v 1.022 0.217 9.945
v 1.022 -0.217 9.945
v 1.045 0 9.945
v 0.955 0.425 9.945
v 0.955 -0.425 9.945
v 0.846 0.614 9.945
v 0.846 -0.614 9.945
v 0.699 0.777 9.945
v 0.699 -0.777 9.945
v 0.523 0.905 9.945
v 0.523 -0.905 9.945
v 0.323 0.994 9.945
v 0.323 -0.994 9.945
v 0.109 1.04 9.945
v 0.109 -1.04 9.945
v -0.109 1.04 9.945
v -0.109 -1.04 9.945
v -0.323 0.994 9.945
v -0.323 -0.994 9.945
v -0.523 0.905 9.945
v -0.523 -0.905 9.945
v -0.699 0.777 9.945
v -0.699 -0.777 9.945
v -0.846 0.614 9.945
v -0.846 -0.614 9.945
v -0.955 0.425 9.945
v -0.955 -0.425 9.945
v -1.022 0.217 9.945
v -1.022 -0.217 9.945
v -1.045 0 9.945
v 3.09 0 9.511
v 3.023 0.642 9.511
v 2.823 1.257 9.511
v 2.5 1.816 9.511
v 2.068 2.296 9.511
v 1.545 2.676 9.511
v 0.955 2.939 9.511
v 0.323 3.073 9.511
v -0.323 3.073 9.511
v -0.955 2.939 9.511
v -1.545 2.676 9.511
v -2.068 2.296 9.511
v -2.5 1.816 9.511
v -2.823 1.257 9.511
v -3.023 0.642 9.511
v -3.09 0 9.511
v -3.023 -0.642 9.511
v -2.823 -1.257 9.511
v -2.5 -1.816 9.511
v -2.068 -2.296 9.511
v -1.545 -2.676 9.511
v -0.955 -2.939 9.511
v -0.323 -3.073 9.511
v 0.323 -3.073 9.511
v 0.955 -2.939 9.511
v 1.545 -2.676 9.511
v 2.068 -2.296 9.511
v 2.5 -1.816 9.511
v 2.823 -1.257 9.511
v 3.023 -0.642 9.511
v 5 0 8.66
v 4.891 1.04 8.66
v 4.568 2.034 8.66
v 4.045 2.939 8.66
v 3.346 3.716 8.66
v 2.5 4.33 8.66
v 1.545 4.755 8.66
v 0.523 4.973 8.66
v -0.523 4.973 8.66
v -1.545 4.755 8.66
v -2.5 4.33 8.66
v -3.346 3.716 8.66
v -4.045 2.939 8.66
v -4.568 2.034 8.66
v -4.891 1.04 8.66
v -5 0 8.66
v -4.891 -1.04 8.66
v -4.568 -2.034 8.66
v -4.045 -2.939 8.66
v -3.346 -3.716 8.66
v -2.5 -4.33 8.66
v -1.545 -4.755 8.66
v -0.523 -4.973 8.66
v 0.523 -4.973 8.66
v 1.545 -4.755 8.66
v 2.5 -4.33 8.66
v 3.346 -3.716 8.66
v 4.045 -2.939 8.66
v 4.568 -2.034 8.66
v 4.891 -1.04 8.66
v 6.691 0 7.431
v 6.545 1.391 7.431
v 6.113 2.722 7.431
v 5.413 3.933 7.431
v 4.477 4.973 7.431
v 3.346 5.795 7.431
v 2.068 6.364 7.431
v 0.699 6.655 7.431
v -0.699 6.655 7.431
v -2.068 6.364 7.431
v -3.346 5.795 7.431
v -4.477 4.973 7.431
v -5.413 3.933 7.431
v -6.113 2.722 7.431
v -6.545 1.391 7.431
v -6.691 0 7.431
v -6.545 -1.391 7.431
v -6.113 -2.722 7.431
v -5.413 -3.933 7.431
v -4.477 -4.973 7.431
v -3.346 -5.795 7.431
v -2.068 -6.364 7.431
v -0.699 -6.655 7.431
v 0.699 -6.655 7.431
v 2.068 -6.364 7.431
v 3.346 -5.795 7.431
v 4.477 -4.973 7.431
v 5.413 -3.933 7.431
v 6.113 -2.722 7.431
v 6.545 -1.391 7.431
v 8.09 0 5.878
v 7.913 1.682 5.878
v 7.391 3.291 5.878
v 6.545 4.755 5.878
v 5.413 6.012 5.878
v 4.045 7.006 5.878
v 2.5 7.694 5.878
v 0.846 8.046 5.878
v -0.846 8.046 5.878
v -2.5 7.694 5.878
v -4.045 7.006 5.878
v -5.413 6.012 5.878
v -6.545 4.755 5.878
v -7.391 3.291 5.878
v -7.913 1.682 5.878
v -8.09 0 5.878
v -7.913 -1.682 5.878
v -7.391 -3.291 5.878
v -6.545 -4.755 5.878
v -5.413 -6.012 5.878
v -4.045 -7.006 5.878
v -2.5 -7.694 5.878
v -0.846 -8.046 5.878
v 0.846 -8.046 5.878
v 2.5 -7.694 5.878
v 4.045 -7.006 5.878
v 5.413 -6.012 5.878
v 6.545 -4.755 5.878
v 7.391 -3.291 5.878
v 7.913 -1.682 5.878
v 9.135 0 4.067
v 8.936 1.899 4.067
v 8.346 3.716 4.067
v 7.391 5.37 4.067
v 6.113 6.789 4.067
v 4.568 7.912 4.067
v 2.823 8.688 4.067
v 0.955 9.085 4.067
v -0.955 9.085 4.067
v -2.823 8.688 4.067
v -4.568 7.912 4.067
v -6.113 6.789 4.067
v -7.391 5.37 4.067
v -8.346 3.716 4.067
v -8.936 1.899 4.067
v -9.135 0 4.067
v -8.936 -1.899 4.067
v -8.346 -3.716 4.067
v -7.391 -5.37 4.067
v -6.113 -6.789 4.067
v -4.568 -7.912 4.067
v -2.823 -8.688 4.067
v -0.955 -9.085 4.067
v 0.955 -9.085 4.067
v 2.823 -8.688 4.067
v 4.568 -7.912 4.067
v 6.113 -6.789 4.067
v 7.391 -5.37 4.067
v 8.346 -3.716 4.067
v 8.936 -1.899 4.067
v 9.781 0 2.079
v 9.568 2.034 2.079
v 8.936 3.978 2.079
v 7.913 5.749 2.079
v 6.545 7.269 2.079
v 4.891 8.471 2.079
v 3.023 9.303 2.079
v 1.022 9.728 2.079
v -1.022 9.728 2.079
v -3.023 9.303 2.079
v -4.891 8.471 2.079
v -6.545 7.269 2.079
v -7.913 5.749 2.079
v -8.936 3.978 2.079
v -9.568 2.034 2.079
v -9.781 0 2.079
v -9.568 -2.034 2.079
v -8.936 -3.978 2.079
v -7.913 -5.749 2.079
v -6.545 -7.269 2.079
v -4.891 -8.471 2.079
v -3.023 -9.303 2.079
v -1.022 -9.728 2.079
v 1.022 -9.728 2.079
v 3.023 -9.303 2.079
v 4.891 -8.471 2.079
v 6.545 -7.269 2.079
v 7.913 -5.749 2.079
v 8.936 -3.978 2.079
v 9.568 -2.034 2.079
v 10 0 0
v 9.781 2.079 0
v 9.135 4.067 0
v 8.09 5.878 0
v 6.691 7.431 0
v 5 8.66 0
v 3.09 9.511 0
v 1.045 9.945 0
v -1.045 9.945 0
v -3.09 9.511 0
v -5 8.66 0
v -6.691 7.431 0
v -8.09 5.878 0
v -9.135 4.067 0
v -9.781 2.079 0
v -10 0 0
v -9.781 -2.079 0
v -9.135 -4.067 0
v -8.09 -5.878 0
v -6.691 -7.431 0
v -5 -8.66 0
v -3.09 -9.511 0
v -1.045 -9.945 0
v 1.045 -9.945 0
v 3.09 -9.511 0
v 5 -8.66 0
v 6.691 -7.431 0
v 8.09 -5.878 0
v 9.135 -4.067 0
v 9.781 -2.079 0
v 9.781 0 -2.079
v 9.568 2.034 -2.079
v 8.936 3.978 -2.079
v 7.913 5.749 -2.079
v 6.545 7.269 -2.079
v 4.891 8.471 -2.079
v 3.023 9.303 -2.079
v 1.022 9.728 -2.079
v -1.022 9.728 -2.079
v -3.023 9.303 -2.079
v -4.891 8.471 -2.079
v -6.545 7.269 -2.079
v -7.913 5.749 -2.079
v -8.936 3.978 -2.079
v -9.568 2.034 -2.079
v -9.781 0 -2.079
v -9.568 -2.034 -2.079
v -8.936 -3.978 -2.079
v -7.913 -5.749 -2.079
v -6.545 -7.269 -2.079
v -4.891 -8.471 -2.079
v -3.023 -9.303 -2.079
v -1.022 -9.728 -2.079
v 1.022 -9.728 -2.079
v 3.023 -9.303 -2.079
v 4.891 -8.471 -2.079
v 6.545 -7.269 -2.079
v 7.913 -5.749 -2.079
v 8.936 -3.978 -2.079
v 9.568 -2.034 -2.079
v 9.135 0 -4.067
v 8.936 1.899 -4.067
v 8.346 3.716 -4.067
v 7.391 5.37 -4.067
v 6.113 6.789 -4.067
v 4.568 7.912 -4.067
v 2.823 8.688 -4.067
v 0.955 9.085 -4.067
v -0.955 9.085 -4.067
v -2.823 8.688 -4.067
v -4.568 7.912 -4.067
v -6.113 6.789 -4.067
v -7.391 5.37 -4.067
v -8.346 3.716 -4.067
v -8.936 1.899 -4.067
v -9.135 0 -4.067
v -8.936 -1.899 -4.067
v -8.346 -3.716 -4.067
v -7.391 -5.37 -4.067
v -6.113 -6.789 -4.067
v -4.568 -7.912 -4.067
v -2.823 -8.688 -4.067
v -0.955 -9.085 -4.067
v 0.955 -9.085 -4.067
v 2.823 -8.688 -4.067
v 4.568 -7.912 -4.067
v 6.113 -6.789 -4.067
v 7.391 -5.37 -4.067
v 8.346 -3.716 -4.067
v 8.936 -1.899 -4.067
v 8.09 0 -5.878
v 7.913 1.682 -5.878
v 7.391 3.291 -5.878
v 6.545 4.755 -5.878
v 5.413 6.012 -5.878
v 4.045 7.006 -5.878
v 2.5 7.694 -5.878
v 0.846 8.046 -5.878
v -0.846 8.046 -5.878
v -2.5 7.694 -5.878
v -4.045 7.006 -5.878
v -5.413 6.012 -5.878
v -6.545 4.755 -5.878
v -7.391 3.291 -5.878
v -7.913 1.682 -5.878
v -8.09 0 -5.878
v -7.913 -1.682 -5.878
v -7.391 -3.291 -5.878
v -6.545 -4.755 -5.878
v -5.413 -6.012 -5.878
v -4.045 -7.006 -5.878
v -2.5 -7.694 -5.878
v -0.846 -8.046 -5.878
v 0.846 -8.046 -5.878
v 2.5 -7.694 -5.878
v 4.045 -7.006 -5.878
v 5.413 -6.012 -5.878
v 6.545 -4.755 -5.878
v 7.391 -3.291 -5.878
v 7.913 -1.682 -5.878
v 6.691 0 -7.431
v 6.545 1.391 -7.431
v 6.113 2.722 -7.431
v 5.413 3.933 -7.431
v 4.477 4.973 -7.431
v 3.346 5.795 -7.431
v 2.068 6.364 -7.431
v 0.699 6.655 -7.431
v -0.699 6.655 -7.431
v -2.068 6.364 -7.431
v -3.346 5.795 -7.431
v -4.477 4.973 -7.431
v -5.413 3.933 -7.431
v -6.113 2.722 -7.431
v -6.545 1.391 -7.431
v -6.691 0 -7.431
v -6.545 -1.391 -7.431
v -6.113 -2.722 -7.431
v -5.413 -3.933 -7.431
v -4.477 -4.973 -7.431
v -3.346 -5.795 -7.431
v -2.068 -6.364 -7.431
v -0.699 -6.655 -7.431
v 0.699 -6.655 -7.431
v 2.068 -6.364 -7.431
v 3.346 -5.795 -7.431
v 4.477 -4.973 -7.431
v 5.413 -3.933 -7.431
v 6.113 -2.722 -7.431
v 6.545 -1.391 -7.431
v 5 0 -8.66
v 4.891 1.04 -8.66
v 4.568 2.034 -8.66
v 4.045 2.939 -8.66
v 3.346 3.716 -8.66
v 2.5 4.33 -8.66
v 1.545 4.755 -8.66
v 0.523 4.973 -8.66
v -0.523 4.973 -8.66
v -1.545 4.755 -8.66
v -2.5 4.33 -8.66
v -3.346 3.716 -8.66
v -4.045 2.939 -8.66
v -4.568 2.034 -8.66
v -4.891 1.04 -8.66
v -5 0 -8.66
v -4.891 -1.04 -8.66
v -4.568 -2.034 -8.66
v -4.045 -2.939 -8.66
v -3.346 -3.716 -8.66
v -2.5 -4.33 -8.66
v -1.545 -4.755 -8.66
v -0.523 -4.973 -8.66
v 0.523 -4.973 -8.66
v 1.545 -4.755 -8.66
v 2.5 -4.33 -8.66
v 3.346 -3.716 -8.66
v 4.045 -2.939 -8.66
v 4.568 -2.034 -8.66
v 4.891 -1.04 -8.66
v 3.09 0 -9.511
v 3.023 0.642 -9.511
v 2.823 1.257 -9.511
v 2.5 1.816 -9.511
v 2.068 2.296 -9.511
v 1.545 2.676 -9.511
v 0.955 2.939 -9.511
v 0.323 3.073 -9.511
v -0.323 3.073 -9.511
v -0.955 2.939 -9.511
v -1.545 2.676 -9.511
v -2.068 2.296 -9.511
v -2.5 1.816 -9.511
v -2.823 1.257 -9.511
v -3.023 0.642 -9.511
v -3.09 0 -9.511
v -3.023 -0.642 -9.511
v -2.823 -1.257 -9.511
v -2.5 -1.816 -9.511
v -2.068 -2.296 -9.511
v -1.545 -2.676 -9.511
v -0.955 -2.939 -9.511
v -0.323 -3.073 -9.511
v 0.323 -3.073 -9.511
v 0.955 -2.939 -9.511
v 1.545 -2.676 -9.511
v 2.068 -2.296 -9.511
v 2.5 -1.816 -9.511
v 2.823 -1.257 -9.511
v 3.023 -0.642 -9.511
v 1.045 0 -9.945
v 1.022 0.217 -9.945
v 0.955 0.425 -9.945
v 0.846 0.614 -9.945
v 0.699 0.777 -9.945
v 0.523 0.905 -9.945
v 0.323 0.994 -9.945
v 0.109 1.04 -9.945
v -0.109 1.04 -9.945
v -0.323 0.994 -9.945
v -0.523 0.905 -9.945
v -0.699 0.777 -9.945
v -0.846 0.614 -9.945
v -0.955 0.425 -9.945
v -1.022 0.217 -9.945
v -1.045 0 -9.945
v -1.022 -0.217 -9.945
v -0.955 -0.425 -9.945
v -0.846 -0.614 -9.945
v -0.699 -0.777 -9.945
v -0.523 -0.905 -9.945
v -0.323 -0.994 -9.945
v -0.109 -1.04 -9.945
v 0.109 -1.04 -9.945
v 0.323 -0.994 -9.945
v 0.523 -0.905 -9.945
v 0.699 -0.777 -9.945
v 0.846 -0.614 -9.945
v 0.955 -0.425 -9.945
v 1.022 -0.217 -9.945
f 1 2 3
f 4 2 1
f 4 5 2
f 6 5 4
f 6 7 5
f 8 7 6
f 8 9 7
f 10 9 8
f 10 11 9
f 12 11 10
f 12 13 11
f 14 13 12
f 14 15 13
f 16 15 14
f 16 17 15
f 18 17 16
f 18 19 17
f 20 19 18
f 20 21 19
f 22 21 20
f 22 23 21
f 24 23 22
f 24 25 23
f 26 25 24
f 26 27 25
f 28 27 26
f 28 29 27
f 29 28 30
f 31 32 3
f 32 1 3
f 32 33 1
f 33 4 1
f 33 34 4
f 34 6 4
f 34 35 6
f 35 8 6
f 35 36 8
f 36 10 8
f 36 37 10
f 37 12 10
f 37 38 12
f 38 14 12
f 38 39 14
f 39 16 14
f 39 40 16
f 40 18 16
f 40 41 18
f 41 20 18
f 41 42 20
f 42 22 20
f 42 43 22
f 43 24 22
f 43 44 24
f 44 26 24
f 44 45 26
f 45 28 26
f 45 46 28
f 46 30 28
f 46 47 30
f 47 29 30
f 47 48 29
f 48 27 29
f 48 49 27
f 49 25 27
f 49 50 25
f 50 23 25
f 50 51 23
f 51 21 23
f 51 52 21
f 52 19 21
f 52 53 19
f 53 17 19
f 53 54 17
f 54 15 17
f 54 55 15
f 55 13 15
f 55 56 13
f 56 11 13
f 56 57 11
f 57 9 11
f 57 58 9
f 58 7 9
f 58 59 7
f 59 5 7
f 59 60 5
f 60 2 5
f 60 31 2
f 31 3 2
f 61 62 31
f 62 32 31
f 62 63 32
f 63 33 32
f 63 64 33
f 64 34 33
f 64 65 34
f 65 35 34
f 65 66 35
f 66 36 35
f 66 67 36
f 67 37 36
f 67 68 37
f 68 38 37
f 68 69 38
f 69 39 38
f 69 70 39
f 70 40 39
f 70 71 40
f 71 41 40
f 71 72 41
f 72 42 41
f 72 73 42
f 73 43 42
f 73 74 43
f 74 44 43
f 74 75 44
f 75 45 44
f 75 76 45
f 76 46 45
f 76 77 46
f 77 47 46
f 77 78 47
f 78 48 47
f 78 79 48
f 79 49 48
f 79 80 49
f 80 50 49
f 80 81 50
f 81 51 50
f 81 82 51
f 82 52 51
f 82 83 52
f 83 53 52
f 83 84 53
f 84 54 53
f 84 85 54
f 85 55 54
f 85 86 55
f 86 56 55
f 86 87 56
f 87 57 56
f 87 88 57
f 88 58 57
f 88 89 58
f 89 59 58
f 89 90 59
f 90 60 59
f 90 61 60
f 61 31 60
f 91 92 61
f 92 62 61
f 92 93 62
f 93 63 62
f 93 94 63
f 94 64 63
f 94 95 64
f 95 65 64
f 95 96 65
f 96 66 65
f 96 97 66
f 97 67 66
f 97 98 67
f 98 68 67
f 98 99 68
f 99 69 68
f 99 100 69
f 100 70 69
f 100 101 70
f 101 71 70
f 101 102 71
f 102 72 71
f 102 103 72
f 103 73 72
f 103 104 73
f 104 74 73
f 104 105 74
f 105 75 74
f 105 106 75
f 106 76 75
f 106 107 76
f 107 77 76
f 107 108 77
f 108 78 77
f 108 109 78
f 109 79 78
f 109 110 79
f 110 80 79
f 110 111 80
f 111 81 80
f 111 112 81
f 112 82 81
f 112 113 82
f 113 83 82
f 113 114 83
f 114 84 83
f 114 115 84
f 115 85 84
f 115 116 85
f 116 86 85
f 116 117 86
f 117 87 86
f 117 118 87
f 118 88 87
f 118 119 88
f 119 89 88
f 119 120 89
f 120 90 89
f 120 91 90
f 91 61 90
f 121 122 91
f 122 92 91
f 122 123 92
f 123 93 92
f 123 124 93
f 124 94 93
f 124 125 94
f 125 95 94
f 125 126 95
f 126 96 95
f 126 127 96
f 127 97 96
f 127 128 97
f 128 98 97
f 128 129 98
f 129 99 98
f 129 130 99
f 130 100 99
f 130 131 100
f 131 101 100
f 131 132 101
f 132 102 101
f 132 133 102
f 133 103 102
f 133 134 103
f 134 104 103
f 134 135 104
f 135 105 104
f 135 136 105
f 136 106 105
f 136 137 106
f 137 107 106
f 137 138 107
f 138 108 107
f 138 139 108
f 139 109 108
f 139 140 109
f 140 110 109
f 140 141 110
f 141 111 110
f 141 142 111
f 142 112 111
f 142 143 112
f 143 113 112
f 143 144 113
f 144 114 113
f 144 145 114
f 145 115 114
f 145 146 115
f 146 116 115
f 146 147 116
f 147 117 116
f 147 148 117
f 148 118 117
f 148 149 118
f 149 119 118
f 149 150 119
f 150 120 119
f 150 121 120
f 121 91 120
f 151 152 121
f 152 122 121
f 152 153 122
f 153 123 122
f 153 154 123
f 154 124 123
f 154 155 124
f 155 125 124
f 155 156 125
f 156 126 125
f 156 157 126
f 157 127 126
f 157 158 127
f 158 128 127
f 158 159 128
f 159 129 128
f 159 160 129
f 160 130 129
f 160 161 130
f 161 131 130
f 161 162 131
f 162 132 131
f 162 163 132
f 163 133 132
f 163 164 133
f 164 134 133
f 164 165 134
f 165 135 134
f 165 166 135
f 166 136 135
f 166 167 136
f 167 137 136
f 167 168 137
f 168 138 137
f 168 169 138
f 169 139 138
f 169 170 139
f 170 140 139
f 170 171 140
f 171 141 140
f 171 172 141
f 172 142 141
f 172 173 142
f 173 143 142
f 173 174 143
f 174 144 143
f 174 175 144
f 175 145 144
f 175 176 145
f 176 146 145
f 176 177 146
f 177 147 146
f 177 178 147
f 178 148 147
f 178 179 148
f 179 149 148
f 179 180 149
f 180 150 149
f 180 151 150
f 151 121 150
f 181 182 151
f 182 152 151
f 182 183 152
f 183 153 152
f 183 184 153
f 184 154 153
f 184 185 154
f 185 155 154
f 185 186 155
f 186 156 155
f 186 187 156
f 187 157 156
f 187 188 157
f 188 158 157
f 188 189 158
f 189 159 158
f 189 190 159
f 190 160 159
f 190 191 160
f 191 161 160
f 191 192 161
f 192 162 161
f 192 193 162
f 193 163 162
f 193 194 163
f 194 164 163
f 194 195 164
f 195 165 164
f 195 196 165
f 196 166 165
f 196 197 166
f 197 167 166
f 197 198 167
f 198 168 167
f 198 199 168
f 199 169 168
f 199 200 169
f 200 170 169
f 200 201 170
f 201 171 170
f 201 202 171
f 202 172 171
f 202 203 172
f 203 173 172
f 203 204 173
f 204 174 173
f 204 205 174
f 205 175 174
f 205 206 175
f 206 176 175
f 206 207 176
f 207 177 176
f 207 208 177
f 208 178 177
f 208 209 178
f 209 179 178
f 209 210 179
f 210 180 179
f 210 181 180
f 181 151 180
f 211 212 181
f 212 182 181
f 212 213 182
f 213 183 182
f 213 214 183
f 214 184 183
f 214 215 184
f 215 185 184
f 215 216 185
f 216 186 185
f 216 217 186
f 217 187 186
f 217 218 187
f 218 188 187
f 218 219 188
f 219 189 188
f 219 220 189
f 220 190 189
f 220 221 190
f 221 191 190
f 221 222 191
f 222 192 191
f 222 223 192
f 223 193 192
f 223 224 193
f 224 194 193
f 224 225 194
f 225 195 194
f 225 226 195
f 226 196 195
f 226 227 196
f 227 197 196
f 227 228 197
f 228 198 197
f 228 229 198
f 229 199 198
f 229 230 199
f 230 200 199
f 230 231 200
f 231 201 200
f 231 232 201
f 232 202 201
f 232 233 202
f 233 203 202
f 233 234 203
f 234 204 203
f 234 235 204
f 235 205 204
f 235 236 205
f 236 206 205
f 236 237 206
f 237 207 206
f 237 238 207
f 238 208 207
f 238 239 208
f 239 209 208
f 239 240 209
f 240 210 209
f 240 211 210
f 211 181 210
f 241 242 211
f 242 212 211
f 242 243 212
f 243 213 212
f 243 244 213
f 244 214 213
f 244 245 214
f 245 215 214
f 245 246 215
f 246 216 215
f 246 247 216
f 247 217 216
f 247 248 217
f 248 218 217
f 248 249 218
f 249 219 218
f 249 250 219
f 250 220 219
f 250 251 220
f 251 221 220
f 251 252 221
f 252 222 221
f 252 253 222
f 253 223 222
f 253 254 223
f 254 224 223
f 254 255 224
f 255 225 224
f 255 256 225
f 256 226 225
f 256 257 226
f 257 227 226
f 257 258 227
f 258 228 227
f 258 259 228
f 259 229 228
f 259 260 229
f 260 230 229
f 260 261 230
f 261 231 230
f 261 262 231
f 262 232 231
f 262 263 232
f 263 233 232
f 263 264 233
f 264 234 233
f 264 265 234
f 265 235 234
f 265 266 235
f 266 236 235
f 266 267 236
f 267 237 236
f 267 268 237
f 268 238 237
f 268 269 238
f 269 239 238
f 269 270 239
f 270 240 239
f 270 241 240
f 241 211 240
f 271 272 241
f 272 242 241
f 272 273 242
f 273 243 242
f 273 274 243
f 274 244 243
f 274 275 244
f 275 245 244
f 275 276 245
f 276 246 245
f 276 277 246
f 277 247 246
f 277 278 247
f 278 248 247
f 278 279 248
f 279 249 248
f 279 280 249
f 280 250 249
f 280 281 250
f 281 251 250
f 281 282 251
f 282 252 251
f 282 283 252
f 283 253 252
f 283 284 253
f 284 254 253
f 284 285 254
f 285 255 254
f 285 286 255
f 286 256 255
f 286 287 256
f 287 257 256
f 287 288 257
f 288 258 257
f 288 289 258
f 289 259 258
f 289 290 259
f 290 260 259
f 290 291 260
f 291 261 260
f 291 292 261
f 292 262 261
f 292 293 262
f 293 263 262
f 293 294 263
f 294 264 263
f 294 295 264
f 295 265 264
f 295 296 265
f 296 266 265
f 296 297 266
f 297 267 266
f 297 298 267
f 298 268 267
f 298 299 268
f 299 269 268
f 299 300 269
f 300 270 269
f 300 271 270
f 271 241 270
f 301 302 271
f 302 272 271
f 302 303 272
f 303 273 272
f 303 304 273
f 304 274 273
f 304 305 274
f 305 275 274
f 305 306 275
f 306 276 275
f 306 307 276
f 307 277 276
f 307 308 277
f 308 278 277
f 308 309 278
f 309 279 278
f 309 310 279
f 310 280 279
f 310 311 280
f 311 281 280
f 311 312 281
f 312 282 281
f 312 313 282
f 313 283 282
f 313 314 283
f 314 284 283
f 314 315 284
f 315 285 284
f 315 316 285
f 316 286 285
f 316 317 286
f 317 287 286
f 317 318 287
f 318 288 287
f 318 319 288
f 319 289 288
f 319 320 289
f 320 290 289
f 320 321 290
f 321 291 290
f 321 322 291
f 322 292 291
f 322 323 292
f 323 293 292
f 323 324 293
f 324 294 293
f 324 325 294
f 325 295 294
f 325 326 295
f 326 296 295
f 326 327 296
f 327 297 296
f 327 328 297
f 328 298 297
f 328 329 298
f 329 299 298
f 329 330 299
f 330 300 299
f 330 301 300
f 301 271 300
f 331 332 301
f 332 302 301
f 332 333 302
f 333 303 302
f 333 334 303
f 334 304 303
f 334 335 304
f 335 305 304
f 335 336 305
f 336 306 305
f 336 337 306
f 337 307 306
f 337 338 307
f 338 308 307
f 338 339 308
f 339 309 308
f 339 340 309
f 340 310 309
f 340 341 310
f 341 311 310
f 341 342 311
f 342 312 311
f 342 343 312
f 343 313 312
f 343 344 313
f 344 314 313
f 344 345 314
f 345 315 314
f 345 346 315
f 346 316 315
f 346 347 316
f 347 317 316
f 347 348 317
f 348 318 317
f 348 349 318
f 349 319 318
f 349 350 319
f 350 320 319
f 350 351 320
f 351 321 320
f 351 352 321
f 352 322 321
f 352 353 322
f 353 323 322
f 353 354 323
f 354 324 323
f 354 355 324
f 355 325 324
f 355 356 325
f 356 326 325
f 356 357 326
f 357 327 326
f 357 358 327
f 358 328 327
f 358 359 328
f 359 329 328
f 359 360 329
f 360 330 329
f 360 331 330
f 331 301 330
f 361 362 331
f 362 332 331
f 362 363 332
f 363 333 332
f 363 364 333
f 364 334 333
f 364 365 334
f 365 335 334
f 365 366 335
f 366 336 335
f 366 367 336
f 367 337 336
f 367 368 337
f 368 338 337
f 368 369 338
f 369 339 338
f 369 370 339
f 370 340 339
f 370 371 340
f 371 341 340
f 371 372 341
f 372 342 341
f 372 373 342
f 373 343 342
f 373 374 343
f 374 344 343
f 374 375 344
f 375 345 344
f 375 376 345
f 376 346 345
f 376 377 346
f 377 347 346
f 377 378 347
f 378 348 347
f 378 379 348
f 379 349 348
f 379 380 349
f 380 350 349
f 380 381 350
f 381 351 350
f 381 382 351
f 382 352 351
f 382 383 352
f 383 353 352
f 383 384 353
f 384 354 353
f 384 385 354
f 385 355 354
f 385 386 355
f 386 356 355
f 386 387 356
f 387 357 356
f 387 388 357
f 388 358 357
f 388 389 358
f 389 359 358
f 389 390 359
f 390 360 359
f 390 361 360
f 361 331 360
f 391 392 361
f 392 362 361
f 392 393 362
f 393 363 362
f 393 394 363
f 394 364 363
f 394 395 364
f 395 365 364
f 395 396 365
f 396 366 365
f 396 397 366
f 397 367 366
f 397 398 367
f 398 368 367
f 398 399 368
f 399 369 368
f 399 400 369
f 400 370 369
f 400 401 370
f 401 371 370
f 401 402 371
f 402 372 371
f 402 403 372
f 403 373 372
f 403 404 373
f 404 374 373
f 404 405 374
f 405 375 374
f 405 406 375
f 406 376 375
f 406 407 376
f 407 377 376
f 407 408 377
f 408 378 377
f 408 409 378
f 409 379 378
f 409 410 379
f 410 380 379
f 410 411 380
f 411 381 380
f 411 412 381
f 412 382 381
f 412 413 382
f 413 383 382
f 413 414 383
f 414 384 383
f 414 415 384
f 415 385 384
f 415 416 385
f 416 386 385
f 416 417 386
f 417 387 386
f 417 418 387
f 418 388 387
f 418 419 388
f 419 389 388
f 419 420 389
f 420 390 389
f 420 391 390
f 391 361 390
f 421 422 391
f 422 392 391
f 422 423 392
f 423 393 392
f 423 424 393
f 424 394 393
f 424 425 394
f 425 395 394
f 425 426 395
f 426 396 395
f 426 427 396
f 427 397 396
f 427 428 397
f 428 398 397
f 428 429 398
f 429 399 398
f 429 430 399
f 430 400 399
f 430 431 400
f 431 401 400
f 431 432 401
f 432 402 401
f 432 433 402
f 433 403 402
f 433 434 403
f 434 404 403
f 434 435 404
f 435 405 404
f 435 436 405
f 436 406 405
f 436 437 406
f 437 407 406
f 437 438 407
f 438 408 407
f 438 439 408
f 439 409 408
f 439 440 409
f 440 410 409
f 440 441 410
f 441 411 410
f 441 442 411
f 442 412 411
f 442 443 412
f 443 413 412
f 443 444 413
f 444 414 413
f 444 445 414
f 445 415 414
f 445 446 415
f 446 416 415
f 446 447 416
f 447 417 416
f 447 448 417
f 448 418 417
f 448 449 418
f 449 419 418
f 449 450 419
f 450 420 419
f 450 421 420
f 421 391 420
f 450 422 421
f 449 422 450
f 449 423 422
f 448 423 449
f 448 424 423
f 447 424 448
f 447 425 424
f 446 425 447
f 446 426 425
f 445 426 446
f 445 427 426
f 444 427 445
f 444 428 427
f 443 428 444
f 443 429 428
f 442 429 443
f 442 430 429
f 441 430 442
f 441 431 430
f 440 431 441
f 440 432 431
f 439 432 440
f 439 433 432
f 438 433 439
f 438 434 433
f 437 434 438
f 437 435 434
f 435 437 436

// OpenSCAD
SHAPE = "sphere"; // [sphere, cube, cube-centered, box-centered, cylinder, cylinder-centered, cone, cone-slice]


module bottom_text(s) {
    color("grey")
    linear_extrude(1);
    translate([0, -25])
    text(s, size = 5, font = "monospace", halign = "center");
}


if (SHAPE == "sphere") {
    sphere(10);
    bottom_text("sphere(10);");
} else if (SHAPE == "cube") {
    cube(10);
    bottom_text("cube(10);");
} else if (SHAPE == "cube-centered") {
    cube(10, center = true);
    bottom_text("cube(10, center = true);");
} else if (SHAPE == "box-centered") {
    cube([10, 20, 30], center = true);
    bottom_text("cube([10, 20, 30], center = true);");
} else if (SHAPE == "cylinder") {
    cylinder(h = 20, r = 10);
    bottom_text("cylinder(h = 10, r = 10);");
} else if (SHAPE == "cylinder-centered") {
    cylinder(h = 20, r = 10, center = true);
    bottom_text("cylinder(h = 10, r = 10, center = true);");
} else if (SHAPE == "cone") {
    cylinder(h = 20, r1 = 10, r2 = 0);
    bottom_text("cylinder(h = 10, r1 = 10, r2 = 0);");
} else if (SHAPE == "cone-slice") {
    cylinder(h = 20, r1 = 10, r2 = 5);
    bottom_text("cylinder(h = 10, r1 = 10, r2 = 5);");
}
